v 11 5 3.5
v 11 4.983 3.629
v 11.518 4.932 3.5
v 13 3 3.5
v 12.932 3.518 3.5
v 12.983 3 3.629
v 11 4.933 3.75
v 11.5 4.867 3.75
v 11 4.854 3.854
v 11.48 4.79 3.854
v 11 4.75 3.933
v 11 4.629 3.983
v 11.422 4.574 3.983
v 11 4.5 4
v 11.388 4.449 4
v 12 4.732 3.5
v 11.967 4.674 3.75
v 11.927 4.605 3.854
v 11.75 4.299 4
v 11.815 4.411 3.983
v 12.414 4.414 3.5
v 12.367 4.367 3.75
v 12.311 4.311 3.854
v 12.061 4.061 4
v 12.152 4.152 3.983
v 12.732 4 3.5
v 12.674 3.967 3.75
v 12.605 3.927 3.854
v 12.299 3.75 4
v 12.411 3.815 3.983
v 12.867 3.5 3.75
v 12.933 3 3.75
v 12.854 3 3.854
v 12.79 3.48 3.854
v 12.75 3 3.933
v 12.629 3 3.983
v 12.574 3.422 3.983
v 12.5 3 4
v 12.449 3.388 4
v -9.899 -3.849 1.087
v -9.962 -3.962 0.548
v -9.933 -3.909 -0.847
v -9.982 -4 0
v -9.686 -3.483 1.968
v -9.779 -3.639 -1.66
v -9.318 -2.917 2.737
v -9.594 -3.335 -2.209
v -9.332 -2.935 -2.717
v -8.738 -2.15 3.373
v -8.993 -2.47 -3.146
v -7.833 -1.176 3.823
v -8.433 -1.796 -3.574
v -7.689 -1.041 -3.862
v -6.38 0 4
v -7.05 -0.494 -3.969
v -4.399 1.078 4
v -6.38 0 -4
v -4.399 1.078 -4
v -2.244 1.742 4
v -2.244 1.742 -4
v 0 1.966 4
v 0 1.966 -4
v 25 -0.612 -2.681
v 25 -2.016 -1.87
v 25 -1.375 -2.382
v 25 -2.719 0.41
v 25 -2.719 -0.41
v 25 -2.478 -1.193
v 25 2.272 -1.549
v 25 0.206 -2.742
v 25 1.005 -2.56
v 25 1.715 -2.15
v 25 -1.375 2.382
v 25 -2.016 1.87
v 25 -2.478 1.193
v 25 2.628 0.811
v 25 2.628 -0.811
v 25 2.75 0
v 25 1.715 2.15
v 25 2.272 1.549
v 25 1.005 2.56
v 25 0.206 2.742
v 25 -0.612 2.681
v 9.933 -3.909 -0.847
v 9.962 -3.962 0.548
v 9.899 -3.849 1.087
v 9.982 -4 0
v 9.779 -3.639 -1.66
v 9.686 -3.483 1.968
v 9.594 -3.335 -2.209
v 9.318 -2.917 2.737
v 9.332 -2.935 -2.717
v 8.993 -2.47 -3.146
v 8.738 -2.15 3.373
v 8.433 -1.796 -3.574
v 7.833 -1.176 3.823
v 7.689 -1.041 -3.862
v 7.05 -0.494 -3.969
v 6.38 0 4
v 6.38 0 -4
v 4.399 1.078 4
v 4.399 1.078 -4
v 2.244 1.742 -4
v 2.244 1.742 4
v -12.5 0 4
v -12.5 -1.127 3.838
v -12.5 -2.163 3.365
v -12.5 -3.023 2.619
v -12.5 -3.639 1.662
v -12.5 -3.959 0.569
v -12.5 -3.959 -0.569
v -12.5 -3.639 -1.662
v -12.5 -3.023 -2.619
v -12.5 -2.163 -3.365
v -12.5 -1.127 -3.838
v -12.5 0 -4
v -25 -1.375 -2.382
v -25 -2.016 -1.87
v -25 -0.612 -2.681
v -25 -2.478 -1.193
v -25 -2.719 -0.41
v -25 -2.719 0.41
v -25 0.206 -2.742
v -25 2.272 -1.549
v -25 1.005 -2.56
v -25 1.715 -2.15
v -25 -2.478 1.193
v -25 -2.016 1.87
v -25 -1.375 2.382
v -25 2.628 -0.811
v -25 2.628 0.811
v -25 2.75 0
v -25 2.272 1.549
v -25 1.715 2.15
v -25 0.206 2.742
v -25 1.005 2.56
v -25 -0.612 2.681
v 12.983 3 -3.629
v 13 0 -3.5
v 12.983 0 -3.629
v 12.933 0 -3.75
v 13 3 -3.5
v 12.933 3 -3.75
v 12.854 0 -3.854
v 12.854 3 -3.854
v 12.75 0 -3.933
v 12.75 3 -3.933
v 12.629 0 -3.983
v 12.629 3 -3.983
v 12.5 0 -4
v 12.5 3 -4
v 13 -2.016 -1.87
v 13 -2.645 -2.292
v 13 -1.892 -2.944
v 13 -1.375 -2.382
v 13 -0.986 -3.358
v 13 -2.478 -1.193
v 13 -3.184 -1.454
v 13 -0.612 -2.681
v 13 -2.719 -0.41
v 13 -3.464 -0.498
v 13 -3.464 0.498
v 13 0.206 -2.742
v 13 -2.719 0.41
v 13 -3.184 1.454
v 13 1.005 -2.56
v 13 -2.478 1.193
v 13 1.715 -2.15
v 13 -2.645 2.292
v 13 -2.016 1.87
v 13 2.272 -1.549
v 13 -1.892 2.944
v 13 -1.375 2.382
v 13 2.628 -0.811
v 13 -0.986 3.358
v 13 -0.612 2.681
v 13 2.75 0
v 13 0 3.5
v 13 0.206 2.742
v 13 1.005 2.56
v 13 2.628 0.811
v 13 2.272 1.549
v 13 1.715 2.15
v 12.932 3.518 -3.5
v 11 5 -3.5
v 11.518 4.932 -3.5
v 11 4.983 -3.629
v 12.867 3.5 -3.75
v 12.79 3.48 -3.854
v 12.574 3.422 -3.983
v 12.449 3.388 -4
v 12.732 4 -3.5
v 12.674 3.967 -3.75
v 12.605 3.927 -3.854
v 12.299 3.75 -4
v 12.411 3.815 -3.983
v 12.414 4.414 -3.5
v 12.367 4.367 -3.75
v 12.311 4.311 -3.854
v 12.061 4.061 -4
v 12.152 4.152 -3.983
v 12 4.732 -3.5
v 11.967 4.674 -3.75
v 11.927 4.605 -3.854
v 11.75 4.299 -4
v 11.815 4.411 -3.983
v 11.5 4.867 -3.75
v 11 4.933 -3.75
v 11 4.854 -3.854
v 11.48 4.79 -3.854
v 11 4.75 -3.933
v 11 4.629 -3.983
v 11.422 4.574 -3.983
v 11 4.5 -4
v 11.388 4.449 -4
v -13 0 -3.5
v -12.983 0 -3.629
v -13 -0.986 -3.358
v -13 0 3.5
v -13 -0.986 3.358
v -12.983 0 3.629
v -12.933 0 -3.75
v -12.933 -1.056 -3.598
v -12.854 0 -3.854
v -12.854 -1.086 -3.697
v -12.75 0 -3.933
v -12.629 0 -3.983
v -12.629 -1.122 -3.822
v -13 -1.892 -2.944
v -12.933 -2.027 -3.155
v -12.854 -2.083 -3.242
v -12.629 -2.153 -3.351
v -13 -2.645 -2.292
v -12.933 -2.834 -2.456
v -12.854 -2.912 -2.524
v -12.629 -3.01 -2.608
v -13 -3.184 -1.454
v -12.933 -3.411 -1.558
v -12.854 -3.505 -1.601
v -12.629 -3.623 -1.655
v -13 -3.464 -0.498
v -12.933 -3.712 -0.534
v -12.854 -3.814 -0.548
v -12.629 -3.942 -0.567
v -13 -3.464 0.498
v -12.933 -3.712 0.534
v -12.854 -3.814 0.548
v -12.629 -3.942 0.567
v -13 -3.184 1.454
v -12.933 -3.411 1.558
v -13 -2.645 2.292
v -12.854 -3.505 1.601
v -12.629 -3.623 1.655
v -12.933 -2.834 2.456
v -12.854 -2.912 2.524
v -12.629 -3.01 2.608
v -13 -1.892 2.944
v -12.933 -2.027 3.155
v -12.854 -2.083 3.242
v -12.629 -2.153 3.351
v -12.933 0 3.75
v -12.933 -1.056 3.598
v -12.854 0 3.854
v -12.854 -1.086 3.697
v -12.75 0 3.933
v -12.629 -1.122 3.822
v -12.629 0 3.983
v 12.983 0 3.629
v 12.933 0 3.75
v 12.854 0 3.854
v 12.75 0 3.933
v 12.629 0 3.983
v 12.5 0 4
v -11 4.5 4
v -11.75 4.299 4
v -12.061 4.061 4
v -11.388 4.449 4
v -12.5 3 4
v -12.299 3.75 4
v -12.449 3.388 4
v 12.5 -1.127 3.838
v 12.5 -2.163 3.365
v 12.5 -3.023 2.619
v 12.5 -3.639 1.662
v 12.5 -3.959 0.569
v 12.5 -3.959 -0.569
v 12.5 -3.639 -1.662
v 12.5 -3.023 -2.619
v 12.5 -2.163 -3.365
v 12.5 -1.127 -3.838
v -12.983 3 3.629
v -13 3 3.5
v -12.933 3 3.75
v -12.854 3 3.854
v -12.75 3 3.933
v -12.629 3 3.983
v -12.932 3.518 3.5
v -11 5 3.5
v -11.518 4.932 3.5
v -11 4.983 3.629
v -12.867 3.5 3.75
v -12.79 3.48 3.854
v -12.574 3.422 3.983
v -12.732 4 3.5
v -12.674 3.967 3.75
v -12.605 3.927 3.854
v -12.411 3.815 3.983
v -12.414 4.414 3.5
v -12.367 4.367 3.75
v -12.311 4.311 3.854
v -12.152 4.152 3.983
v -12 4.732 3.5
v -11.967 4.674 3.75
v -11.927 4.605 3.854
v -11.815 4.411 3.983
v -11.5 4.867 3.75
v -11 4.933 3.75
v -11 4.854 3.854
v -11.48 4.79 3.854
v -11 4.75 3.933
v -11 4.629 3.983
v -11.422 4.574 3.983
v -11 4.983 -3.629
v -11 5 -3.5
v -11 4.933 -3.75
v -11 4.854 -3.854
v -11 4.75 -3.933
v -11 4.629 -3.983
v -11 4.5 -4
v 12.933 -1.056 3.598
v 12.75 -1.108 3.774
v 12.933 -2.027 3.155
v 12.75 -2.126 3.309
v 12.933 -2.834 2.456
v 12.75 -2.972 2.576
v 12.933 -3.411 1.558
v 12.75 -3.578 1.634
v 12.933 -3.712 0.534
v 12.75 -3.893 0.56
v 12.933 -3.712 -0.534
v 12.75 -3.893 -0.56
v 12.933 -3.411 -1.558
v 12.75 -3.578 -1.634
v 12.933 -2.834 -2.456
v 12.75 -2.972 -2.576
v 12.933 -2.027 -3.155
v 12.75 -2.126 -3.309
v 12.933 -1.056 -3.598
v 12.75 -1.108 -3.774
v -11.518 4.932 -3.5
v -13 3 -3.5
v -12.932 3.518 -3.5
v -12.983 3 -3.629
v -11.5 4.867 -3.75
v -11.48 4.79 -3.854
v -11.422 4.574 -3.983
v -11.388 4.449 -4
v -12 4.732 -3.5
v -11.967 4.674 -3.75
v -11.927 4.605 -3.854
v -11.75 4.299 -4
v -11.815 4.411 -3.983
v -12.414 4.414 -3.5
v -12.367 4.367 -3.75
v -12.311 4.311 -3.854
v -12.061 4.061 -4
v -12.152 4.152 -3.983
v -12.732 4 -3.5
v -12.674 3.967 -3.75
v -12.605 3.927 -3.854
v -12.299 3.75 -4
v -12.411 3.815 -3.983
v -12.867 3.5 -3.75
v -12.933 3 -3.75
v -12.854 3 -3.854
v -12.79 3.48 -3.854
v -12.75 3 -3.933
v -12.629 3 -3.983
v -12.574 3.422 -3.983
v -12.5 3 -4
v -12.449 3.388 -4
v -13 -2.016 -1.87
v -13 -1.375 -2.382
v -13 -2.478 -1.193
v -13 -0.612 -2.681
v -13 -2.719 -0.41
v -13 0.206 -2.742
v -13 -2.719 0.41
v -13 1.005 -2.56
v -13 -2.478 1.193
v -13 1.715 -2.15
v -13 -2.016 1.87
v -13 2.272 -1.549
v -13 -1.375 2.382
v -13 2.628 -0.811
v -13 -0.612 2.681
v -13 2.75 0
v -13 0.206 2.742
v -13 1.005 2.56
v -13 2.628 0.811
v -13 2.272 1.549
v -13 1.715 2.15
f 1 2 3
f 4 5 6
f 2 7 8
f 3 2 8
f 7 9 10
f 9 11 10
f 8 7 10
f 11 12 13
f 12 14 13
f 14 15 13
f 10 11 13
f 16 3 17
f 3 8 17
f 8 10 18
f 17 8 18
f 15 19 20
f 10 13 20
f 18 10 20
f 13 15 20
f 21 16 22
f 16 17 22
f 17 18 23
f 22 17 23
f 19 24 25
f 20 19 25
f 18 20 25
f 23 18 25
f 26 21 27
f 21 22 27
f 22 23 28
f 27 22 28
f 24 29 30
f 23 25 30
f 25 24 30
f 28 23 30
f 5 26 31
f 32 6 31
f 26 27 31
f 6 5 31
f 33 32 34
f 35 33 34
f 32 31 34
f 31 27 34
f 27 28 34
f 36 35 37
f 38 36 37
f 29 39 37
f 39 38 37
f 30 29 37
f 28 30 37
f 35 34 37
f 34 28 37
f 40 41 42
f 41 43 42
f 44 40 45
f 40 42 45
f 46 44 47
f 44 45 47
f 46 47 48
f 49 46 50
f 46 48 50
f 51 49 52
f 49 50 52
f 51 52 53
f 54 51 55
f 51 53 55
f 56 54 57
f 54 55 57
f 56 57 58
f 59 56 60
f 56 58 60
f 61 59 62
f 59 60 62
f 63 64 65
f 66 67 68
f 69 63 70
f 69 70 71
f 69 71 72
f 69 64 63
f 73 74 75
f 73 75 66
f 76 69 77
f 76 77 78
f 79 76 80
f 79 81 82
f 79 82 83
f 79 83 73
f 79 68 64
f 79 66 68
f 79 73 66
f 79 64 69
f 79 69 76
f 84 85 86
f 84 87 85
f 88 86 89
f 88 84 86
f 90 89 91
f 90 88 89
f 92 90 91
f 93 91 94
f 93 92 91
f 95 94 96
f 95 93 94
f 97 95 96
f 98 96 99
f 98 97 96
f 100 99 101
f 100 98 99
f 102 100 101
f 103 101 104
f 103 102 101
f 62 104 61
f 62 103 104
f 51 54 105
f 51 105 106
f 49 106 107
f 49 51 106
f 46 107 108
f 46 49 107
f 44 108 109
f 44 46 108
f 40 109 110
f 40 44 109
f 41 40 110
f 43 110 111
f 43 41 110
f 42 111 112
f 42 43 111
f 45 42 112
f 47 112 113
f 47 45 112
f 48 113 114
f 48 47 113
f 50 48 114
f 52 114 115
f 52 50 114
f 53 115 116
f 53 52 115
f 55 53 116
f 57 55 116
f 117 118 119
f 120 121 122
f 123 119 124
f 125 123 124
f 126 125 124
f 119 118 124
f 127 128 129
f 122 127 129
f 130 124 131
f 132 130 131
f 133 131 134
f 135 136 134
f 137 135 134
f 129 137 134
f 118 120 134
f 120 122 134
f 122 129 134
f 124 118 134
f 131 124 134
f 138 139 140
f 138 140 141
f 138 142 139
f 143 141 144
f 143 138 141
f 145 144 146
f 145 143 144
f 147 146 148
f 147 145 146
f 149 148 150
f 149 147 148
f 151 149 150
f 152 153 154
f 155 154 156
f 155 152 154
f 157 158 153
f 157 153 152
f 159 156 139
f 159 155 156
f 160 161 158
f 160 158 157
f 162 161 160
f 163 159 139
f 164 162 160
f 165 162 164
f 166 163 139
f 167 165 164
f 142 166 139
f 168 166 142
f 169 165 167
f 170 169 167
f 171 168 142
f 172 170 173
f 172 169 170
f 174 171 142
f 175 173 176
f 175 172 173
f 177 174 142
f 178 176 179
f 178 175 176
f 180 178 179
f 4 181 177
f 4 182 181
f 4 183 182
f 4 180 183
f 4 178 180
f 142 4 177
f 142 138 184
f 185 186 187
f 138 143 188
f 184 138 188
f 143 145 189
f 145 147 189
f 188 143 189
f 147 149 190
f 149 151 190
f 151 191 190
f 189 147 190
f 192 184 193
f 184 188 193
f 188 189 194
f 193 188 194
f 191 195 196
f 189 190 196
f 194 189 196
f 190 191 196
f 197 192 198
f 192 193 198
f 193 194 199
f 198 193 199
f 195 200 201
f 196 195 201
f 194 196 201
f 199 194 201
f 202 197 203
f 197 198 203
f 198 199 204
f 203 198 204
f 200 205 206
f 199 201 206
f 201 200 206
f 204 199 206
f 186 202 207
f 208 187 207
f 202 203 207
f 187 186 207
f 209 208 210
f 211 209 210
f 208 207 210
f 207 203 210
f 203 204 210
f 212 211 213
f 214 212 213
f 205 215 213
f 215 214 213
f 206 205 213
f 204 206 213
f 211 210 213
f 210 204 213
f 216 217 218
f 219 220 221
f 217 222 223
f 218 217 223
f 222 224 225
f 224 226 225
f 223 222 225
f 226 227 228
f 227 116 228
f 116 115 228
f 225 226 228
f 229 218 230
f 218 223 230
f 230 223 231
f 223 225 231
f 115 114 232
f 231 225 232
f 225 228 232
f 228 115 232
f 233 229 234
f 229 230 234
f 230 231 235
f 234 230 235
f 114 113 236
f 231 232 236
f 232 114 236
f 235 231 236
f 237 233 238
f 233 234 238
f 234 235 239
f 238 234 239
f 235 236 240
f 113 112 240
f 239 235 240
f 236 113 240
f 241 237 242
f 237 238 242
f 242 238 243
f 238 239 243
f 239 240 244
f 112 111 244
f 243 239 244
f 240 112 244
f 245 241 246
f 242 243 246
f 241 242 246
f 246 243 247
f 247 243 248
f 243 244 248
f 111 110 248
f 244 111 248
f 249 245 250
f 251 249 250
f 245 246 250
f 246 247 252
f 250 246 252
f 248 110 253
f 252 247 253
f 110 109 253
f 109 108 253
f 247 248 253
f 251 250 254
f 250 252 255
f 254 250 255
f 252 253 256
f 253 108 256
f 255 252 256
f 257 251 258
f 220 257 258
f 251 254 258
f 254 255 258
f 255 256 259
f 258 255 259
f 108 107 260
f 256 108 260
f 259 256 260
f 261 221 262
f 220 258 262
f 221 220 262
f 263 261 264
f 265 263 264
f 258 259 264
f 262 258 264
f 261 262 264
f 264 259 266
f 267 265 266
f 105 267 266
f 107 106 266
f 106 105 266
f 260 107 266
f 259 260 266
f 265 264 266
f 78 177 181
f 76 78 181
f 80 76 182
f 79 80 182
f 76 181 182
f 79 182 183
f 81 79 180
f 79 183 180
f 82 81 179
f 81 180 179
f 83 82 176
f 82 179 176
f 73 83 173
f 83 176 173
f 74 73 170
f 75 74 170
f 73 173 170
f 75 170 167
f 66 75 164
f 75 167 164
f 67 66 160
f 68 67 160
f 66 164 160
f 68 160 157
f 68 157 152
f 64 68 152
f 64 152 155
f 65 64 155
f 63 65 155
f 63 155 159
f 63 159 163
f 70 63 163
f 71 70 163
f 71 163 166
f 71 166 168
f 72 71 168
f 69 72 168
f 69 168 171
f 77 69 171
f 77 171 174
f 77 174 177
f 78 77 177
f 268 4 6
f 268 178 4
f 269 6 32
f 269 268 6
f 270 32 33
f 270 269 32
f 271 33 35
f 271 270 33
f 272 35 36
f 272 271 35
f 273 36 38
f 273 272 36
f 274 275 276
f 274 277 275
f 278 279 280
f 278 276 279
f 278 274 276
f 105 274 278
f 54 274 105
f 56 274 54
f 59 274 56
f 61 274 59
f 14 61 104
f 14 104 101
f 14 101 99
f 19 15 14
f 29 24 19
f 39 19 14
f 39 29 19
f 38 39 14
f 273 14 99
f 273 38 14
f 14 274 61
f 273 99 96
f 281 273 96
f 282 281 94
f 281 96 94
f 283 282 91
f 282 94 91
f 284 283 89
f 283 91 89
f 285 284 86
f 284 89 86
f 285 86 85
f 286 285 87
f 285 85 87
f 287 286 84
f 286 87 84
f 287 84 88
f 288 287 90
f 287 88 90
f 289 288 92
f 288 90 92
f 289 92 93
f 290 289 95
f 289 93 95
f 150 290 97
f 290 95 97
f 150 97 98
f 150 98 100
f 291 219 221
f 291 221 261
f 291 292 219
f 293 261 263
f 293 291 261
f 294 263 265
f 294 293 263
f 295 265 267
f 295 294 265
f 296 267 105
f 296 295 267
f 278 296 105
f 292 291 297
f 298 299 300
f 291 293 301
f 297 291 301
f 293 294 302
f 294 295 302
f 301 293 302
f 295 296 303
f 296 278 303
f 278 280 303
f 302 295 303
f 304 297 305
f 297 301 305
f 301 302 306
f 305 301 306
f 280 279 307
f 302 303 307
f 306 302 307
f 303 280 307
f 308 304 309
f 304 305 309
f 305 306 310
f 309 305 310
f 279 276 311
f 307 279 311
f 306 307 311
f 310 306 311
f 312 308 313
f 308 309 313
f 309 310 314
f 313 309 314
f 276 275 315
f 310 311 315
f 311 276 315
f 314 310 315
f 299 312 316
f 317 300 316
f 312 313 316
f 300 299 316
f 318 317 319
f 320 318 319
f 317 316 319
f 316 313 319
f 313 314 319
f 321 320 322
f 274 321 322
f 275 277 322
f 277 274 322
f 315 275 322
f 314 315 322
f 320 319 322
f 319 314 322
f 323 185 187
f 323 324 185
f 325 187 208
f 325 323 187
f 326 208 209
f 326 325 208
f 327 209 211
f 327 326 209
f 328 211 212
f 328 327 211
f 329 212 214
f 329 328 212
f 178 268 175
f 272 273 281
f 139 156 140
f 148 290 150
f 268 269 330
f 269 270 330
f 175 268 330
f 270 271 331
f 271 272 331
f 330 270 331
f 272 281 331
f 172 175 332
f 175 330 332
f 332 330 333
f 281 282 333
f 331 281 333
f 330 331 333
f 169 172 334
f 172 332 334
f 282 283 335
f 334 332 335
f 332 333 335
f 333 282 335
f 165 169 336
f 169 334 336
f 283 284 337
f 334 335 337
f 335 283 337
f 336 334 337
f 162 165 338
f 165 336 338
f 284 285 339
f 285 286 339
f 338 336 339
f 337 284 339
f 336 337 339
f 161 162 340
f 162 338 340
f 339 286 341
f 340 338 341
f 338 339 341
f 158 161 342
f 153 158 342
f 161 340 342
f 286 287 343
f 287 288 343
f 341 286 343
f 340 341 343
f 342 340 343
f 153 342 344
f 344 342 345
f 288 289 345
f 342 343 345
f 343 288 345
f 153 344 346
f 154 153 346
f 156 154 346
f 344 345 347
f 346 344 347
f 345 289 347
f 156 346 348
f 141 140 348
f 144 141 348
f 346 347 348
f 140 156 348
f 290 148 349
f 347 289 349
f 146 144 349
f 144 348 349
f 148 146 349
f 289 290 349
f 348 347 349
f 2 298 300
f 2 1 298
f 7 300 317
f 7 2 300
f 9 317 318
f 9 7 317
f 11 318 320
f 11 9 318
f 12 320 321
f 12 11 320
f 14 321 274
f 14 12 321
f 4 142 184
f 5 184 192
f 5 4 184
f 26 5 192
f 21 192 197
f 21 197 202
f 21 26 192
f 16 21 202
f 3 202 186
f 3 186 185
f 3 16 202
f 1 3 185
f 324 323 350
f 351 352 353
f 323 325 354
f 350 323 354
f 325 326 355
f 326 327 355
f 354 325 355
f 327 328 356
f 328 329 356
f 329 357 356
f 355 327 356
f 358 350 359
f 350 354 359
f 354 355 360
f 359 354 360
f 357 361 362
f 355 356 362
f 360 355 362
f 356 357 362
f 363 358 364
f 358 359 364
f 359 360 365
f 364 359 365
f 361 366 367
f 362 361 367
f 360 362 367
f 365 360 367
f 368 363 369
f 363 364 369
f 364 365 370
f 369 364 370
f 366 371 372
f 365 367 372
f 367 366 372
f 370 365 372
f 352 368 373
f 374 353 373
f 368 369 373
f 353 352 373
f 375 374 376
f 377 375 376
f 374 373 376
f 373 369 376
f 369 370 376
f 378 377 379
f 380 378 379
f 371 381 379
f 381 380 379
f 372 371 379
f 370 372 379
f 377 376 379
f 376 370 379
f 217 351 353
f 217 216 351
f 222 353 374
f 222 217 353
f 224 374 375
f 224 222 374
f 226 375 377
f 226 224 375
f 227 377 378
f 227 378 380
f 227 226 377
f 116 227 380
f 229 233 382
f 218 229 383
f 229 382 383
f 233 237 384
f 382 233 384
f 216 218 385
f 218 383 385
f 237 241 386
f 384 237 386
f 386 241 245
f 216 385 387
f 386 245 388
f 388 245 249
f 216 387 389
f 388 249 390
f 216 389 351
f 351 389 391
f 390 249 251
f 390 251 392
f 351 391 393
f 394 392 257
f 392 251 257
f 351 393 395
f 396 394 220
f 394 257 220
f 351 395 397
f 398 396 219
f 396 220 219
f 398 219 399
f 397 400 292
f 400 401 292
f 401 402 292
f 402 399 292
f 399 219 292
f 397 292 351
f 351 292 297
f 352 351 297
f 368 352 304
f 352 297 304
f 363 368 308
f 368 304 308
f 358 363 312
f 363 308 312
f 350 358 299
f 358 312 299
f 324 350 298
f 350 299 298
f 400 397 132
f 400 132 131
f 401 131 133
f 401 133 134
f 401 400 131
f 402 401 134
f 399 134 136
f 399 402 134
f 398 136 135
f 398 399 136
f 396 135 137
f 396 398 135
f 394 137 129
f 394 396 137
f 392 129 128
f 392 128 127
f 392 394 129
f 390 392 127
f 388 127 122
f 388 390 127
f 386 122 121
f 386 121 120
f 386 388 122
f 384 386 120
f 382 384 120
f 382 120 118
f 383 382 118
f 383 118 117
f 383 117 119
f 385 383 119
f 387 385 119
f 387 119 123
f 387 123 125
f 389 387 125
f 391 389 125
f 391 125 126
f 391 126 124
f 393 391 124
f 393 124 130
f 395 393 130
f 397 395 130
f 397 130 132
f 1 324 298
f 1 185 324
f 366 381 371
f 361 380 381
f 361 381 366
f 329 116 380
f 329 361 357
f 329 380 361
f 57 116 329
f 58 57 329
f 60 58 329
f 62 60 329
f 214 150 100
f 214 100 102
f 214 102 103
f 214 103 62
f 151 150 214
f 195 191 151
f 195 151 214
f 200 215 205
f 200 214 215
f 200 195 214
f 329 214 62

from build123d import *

# Parameters (mm, degrees)
F0_R          = 2.75
F1_DEPTH      = 25
F2_DEPTH      = 13
F3_R          = 2
F5_DEPTH      = 25
F5_DEPTH_BACK = 25
F7_R          = 0.5


with BuildPart() as f1:
    # F0 (on Right) → F1 (new body)
    with BuildSketch(Plane.YZ):
        Circle(F0_R)
    extrude(amount=F1_DEPTH)

    # F0 (on Right) → F2 (join)
    with BuildSketch(Plane.YZ):
        with BuildLine():
            ThreePointArc((0, -4), (2.8284271247, -2.8284271247), (4, 0))
            ThreePointArc((4, 0), (2.8284271247, 2.8284271247), (0, 4))
            ThreePointArc((0, 4), (-4, 0), (0, -4))
        make_face()
        Circle(F0_R, mode=Mode.SUBTRACT)
        with BuildLine():
            ThreePointArc((0, 4), (2.8284271247, 2.8284271247), (4, 0))
            ThreePointArc((4, 0), (2.8284271247, -2.8284271247), (0, -4))
            Line((0, -4), (5, -4))
            Line((5, -4), (5, 4))
            Line((5, 4), (0, 4))
        make_face()
    extrude(amount=F2_DEPTH)

    # F3
    f3_edges = [f1.edges().sort_by_distance(p)[0] for p in [
        (13, 5, 0),
    ]]
    fillet(f3_edges, radius=F3_R)

    # F4 (on Top) → F5 (cut, two sides)
    with BuildSketch(Plane.XY) as f5_sk:
        with BuildLine():
            Line((0, 1.9661990377), (0, -4.0338009623))
            Line((0, -4.0338009623), (10, -4.0338009623))
            ThreePointArc((10, -4.0338009623), (5.8309518948, 0.3511188625), (0, 1.9661990377))
        make_face()
    extrude(amount=F5_DEPTH, mode=Mode.SUBTRACT)
    extrude(f5_sk.sketch, amount=-F5_DEPTH_BACK, mode=Mode.SUBTRACT)

    # F6: F1 across face


with BuildPart() as f1_1:
    add(f1.part)
    add(f1.part.mirror(Plane(origin=(0, 3.4830995189, 0), x_dir=(0, -1, 0), z_dir=(-1, 0, 0))))

    # F7
    f7_edges = [f1_1.edges().sort_by_distance(p)[0] for p in [
        (13, -4, 0),
        (-13, -4, 0),
        (13, 1.5, -4),
        (13, 1.5, 4),
        (0, 5, 4),
        (12.414214, 4.414214, 4),
        (-13, 1.5, 4),
        (-12.414214, 4.414214, 4),
        (-12.414214, 4.414214, -4),
        (-13, 1.5, -4),
        (0, 5, -4),
        (12.414214, 4.414214, -4),
    ]]
    fillet(f7_edges, radius=F7_R)


solid = f1_1.part
